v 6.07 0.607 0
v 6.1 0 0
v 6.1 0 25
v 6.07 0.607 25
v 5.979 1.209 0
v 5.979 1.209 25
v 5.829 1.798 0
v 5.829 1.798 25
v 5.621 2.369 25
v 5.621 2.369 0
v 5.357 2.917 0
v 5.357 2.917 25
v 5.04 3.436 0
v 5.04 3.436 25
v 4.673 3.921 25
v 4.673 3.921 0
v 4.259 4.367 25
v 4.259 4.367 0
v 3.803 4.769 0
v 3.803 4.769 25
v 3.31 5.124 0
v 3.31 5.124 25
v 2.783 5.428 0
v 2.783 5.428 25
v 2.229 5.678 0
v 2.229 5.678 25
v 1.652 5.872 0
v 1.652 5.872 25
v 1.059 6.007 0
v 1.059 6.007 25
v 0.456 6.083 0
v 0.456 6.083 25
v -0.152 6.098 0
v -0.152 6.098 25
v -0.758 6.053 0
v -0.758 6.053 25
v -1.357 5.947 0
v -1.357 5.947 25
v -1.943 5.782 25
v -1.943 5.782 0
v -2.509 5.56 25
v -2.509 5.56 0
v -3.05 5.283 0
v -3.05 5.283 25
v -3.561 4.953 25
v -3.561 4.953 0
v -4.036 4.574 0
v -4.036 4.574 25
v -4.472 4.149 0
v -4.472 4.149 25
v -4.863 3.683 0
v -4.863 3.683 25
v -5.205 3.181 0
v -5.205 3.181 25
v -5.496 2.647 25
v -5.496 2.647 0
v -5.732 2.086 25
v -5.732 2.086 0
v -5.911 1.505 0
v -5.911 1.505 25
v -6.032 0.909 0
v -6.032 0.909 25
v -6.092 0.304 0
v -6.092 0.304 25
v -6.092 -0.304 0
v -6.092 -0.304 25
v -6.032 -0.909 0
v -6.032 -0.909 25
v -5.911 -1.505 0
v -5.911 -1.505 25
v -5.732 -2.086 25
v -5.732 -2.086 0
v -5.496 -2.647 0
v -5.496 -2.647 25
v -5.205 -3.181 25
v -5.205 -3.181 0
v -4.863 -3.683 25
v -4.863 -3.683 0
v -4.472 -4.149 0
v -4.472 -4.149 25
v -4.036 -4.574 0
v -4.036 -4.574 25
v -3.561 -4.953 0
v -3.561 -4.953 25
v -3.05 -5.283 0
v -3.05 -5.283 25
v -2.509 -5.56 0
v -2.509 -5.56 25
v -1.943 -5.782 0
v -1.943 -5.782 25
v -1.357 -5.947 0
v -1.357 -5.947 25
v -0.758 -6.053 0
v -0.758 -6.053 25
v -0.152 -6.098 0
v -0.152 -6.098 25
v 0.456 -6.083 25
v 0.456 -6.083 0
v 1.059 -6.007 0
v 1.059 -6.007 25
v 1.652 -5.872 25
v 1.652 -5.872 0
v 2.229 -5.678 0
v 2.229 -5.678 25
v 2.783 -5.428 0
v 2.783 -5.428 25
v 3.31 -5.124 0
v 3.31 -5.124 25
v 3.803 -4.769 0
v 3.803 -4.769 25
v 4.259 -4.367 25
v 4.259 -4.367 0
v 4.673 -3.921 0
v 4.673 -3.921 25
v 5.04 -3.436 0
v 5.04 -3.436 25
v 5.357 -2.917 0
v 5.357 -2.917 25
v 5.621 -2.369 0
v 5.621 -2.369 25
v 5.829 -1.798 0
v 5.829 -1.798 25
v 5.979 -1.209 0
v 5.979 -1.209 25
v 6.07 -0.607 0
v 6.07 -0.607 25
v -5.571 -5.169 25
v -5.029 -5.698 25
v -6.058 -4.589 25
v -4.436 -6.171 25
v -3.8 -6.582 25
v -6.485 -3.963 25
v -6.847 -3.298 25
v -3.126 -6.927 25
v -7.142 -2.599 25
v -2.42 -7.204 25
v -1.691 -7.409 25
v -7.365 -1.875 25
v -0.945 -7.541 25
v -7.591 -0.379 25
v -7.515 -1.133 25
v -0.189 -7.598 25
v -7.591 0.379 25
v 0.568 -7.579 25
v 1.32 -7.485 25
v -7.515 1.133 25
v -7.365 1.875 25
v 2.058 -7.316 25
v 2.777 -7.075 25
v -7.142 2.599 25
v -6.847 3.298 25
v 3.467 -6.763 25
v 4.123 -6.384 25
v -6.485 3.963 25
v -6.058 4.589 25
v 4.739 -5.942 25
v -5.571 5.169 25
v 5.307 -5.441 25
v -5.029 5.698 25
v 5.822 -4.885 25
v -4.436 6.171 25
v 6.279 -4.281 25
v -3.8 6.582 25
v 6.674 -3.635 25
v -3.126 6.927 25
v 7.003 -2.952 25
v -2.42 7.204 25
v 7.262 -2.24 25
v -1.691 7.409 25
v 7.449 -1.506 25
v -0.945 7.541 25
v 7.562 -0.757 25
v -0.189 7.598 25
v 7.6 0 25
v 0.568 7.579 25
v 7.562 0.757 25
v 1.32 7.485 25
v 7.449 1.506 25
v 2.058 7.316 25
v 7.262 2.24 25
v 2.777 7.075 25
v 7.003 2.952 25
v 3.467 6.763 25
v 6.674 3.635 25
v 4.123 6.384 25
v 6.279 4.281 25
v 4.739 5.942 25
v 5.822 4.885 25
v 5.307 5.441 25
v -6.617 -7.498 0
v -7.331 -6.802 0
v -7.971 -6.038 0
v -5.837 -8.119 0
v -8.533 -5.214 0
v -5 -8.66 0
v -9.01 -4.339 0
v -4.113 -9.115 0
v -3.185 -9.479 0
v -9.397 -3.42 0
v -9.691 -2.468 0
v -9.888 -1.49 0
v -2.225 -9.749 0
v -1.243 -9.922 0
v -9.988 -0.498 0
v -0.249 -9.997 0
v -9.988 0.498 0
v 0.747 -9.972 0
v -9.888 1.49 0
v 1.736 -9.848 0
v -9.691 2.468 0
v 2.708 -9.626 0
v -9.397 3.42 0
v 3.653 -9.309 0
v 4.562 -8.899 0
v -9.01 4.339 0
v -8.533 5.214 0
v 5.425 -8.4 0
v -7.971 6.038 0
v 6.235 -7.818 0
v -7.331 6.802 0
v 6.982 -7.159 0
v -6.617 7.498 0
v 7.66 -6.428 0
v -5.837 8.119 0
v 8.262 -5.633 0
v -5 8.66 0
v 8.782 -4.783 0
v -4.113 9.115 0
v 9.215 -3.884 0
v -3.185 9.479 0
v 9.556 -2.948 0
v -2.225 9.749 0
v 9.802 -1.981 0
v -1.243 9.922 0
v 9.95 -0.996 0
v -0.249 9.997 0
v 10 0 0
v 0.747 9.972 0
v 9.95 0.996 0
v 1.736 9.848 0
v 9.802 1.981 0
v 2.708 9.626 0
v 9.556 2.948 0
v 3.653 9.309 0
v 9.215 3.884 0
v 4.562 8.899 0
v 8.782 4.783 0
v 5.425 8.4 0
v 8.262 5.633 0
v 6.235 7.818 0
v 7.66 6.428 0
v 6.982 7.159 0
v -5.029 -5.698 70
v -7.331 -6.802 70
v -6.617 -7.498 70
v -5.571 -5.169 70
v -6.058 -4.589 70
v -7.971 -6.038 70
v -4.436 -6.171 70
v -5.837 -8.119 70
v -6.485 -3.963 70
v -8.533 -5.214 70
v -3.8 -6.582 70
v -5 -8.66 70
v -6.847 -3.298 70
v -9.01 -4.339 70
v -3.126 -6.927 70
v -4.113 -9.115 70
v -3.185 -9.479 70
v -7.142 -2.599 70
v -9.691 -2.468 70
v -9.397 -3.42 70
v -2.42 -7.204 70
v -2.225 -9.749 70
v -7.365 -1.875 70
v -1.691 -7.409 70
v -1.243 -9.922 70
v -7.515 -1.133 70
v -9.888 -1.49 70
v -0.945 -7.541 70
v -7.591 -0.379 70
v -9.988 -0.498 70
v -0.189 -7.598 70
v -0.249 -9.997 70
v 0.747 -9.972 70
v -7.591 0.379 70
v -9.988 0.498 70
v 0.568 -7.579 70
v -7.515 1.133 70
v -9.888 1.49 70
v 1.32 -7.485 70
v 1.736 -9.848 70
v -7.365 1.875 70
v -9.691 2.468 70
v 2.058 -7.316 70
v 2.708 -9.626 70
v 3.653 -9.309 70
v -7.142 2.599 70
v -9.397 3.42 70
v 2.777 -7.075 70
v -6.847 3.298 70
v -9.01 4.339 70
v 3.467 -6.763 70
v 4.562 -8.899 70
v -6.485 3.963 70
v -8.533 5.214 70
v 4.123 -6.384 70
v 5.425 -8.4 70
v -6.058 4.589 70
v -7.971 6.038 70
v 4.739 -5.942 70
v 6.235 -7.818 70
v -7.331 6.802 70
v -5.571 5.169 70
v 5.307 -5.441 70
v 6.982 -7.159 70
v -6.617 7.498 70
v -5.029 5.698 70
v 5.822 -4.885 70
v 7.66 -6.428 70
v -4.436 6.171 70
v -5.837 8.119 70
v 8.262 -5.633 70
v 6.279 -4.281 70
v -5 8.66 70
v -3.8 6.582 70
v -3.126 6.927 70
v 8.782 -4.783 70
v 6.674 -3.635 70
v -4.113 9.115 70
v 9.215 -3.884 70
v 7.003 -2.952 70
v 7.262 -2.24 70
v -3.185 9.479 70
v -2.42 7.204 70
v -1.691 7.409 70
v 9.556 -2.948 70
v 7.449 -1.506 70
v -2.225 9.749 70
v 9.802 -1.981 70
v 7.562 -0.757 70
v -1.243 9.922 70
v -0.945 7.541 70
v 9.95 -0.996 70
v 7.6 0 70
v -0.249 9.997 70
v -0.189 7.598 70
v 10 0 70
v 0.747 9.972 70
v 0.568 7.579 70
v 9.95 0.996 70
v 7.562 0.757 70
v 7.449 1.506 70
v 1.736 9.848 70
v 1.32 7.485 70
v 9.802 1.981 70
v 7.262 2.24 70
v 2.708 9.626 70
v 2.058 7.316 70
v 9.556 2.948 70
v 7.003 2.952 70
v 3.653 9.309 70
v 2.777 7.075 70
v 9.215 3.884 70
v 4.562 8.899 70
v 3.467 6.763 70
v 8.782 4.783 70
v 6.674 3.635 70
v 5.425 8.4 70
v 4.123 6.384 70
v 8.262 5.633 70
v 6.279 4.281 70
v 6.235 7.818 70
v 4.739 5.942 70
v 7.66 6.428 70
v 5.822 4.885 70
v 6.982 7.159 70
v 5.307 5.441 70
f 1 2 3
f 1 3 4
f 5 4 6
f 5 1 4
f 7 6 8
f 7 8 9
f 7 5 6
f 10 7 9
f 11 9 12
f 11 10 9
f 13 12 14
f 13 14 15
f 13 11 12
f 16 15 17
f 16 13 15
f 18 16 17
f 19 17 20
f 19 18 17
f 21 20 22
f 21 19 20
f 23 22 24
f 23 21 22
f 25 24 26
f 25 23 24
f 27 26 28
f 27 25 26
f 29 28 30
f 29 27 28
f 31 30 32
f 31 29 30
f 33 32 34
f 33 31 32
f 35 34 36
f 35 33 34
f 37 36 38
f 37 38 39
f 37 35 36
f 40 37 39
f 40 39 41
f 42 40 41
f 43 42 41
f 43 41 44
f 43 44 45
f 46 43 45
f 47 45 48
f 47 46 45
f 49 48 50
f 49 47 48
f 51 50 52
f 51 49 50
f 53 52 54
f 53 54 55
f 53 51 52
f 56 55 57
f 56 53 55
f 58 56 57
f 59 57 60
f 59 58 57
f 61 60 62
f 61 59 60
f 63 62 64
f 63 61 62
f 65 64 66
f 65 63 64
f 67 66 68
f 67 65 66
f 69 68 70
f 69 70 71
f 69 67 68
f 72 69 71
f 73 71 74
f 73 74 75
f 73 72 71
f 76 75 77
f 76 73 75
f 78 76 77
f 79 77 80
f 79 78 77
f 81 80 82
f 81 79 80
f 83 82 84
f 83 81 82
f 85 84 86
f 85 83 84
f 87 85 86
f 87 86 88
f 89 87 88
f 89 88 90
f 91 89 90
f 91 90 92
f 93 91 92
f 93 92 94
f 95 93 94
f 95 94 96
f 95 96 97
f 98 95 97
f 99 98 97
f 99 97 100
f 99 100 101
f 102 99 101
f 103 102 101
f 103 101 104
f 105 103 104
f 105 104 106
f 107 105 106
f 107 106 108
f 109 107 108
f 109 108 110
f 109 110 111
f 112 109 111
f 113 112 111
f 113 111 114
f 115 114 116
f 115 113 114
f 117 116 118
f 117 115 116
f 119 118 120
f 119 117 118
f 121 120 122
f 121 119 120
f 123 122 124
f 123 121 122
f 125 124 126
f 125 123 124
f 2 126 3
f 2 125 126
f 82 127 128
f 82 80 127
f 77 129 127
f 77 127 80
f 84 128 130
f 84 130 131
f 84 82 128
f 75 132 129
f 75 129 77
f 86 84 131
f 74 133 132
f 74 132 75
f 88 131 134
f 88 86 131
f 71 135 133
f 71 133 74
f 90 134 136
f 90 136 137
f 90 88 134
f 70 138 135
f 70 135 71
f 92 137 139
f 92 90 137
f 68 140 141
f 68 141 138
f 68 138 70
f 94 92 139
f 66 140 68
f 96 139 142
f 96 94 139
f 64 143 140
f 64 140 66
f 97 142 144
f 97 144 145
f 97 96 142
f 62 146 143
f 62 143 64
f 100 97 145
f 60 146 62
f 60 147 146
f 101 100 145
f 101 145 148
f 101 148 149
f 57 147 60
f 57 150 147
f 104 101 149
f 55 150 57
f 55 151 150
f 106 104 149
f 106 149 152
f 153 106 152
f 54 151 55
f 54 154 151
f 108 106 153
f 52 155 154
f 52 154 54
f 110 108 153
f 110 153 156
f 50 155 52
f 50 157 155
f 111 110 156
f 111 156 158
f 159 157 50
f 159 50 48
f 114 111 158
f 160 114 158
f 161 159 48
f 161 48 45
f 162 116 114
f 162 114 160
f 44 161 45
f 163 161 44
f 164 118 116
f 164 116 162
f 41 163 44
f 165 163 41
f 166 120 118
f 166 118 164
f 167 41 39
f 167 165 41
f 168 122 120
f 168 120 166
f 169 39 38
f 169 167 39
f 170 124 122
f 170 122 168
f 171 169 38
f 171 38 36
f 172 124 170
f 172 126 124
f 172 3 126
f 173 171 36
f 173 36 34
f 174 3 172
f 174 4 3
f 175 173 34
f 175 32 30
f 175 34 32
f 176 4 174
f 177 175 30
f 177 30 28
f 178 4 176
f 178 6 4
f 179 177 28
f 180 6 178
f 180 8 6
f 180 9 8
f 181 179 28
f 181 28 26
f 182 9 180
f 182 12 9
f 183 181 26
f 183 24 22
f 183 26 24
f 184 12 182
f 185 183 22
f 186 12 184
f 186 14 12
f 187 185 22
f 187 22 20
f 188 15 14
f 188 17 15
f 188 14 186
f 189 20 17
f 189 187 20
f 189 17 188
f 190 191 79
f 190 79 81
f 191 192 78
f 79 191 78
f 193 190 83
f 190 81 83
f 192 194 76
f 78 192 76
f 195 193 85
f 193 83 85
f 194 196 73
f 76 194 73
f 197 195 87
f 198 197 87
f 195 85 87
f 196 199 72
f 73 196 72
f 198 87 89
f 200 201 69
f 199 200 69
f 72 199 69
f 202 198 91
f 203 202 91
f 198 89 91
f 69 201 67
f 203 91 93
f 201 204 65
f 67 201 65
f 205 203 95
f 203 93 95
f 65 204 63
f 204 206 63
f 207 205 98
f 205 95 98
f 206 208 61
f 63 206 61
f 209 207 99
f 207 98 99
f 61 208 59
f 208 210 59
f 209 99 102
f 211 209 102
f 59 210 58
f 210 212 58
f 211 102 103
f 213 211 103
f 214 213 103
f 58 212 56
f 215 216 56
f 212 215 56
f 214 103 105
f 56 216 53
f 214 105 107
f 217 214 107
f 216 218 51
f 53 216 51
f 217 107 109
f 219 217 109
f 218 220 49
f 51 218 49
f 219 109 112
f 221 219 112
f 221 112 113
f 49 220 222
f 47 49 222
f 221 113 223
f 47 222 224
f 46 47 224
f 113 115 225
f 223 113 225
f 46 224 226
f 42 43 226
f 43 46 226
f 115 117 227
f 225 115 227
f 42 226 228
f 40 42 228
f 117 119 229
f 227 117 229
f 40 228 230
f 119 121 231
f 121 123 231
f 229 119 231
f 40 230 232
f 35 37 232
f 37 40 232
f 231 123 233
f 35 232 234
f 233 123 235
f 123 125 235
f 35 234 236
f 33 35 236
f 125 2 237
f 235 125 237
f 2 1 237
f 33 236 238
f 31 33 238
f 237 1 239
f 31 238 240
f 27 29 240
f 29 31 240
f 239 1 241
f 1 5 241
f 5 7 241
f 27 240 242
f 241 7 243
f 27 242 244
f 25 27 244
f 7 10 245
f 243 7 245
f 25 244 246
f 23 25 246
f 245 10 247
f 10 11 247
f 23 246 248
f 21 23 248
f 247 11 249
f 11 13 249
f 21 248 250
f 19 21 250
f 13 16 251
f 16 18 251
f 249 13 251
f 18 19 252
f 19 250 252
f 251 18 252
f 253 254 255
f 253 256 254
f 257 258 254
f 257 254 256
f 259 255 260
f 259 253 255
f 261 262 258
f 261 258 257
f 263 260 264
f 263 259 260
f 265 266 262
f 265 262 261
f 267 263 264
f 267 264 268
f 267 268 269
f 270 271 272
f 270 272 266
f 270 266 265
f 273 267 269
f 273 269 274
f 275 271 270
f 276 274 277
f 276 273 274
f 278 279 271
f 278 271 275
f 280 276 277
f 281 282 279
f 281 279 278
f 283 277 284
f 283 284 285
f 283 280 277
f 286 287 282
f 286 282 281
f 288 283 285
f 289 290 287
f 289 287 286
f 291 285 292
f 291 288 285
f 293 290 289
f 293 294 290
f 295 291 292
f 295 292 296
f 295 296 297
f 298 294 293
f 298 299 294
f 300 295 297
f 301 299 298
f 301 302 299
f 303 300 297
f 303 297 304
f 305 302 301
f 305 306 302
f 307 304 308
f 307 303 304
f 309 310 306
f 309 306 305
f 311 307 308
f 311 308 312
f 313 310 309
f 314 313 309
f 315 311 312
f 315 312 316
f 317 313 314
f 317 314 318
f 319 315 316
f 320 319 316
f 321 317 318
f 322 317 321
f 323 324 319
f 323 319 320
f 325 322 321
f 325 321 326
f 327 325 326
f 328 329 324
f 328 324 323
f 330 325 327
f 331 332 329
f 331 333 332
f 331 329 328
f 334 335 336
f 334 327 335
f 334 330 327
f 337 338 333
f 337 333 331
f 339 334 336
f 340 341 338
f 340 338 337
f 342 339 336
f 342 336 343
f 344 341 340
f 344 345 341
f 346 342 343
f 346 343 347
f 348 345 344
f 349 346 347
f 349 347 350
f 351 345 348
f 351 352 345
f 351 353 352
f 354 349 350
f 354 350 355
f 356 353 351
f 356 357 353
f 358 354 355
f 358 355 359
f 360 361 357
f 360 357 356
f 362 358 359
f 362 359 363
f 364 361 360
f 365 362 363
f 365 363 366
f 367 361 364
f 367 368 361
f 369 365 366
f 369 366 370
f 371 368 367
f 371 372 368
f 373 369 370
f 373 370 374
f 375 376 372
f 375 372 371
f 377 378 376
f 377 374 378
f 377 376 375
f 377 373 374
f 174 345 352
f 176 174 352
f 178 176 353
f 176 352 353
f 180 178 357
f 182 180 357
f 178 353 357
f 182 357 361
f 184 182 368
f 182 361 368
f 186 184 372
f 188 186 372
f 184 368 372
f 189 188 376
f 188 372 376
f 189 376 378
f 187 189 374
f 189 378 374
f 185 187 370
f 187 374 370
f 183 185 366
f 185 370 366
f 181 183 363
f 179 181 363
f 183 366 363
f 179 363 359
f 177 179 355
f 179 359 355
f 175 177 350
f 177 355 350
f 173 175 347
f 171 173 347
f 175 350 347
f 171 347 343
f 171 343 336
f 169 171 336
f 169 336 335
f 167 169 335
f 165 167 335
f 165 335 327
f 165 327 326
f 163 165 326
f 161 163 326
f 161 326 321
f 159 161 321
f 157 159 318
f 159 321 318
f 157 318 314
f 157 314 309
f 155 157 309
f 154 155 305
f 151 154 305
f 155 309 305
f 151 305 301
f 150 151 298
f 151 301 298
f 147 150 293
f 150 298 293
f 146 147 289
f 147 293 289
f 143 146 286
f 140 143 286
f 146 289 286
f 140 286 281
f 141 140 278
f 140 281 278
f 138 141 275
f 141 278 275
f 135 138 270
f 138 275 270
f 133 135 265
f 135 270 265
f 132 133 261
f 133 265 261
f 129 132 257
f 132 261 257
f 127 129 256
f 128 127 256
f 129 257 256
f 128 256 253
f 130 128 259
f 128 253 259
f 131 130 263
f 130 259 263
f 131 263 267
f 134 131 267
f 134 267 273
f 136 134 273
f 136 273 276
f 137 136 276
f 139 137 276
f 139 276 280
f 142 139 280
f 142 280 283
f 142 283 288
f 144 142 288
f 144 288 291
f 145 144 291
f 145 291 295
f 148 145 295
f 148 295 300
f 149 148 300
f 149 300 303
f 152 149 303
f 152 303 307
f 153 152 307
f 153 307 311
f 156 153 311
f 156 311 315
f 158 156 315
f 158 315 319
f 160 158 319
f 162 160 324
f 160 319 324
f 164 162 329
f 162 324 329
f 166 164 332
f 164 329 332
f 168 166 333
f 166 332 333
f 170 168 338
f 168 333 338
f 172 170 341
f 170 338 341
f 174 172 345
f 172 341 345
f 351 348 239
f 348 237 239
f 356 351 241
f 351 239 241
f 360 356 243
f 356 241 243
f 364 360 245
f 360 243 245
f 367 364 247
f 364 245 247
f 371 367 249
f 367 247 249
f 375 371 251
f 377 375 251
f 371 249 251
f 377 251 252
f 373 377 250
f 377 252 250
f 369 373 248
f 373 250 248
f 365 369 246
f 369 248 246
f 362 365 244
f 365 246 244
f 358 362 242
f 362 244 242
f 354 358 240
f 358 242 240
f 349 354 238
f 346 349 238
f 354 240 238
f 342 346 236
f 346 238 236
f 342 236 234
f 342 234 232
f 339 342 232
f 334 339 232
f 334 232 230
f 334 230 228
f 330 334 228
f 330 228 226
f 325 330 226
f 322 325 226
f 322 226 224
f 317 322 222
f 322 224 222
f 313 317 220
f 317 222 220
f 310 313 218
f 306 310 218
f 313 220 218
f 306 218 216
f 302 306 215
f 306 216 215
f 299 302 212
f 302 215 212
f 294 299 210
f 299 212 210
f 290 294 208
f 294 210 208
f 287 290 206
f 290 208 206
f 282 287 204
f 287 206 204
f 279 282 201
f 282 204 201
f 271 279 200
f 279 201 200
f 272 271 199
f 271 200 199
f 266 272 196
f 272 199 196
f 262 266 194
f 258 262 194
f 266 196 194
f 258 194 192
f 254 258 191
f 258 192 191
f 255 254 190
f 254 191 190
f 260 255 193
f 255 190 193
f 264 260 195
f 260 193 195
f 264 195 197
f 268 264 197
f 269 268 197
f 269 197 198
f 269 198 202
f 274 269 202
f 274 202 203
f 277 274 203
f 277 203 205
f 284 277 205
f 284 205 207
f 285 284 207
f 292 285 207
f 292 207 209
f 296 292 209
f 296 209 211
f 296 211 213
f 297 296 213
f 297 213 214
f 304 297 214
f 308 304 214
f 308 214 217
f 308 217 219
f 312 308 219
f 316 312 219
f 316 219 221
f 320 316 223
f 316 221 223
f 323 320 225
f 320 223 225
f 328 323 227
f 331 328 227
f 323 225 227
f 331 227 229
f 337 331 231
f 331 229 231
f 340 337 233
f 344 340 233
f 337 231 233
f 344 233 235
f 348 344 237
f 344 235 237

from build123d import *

# Parameters (mm, degrees)
SKETCH2_R           = 10
SKETCH2_R_2         = 6.1
BOSS_EXTRUDE1_DEPTH = 25
SKETCH3_R           = 10
BOSS_EXTRUDE2_DEPTH = 45
SKETCH4_R           = 7.6
CUT_EXTRUDE1_DEPTH  = 45


with BuildPart() as part:
    # Sketch2 → Boss-Extrude1 (new body)
    with BuildSketch(Plane.XY):
        Circle(SKETCH2_R)
        Circle(SKETCH2_R_2, mode=Mode.SUBTRACT)
    extrude(amount=BOSS_EXTRUDE1_DEPTH)

    # Sketch3 → Boss-Extrude2 (add)
    with BuildSketch(Plane.XY.offset(25)):
        Circle(SKETCH3_R)
    extrude(amount=BOSS_EXTRUDE2_DEPTH)

    # Sketch4 → Cut-Extrude1 (cut)
    with BuildSketch(Plane.XY.offset(70)):
        Circle(SKETCH4_R)
    extrude(amount=-CUT_EXTRUDE1_DEPTH, mode=Mode.SUBTRACT)


solid = part.part
